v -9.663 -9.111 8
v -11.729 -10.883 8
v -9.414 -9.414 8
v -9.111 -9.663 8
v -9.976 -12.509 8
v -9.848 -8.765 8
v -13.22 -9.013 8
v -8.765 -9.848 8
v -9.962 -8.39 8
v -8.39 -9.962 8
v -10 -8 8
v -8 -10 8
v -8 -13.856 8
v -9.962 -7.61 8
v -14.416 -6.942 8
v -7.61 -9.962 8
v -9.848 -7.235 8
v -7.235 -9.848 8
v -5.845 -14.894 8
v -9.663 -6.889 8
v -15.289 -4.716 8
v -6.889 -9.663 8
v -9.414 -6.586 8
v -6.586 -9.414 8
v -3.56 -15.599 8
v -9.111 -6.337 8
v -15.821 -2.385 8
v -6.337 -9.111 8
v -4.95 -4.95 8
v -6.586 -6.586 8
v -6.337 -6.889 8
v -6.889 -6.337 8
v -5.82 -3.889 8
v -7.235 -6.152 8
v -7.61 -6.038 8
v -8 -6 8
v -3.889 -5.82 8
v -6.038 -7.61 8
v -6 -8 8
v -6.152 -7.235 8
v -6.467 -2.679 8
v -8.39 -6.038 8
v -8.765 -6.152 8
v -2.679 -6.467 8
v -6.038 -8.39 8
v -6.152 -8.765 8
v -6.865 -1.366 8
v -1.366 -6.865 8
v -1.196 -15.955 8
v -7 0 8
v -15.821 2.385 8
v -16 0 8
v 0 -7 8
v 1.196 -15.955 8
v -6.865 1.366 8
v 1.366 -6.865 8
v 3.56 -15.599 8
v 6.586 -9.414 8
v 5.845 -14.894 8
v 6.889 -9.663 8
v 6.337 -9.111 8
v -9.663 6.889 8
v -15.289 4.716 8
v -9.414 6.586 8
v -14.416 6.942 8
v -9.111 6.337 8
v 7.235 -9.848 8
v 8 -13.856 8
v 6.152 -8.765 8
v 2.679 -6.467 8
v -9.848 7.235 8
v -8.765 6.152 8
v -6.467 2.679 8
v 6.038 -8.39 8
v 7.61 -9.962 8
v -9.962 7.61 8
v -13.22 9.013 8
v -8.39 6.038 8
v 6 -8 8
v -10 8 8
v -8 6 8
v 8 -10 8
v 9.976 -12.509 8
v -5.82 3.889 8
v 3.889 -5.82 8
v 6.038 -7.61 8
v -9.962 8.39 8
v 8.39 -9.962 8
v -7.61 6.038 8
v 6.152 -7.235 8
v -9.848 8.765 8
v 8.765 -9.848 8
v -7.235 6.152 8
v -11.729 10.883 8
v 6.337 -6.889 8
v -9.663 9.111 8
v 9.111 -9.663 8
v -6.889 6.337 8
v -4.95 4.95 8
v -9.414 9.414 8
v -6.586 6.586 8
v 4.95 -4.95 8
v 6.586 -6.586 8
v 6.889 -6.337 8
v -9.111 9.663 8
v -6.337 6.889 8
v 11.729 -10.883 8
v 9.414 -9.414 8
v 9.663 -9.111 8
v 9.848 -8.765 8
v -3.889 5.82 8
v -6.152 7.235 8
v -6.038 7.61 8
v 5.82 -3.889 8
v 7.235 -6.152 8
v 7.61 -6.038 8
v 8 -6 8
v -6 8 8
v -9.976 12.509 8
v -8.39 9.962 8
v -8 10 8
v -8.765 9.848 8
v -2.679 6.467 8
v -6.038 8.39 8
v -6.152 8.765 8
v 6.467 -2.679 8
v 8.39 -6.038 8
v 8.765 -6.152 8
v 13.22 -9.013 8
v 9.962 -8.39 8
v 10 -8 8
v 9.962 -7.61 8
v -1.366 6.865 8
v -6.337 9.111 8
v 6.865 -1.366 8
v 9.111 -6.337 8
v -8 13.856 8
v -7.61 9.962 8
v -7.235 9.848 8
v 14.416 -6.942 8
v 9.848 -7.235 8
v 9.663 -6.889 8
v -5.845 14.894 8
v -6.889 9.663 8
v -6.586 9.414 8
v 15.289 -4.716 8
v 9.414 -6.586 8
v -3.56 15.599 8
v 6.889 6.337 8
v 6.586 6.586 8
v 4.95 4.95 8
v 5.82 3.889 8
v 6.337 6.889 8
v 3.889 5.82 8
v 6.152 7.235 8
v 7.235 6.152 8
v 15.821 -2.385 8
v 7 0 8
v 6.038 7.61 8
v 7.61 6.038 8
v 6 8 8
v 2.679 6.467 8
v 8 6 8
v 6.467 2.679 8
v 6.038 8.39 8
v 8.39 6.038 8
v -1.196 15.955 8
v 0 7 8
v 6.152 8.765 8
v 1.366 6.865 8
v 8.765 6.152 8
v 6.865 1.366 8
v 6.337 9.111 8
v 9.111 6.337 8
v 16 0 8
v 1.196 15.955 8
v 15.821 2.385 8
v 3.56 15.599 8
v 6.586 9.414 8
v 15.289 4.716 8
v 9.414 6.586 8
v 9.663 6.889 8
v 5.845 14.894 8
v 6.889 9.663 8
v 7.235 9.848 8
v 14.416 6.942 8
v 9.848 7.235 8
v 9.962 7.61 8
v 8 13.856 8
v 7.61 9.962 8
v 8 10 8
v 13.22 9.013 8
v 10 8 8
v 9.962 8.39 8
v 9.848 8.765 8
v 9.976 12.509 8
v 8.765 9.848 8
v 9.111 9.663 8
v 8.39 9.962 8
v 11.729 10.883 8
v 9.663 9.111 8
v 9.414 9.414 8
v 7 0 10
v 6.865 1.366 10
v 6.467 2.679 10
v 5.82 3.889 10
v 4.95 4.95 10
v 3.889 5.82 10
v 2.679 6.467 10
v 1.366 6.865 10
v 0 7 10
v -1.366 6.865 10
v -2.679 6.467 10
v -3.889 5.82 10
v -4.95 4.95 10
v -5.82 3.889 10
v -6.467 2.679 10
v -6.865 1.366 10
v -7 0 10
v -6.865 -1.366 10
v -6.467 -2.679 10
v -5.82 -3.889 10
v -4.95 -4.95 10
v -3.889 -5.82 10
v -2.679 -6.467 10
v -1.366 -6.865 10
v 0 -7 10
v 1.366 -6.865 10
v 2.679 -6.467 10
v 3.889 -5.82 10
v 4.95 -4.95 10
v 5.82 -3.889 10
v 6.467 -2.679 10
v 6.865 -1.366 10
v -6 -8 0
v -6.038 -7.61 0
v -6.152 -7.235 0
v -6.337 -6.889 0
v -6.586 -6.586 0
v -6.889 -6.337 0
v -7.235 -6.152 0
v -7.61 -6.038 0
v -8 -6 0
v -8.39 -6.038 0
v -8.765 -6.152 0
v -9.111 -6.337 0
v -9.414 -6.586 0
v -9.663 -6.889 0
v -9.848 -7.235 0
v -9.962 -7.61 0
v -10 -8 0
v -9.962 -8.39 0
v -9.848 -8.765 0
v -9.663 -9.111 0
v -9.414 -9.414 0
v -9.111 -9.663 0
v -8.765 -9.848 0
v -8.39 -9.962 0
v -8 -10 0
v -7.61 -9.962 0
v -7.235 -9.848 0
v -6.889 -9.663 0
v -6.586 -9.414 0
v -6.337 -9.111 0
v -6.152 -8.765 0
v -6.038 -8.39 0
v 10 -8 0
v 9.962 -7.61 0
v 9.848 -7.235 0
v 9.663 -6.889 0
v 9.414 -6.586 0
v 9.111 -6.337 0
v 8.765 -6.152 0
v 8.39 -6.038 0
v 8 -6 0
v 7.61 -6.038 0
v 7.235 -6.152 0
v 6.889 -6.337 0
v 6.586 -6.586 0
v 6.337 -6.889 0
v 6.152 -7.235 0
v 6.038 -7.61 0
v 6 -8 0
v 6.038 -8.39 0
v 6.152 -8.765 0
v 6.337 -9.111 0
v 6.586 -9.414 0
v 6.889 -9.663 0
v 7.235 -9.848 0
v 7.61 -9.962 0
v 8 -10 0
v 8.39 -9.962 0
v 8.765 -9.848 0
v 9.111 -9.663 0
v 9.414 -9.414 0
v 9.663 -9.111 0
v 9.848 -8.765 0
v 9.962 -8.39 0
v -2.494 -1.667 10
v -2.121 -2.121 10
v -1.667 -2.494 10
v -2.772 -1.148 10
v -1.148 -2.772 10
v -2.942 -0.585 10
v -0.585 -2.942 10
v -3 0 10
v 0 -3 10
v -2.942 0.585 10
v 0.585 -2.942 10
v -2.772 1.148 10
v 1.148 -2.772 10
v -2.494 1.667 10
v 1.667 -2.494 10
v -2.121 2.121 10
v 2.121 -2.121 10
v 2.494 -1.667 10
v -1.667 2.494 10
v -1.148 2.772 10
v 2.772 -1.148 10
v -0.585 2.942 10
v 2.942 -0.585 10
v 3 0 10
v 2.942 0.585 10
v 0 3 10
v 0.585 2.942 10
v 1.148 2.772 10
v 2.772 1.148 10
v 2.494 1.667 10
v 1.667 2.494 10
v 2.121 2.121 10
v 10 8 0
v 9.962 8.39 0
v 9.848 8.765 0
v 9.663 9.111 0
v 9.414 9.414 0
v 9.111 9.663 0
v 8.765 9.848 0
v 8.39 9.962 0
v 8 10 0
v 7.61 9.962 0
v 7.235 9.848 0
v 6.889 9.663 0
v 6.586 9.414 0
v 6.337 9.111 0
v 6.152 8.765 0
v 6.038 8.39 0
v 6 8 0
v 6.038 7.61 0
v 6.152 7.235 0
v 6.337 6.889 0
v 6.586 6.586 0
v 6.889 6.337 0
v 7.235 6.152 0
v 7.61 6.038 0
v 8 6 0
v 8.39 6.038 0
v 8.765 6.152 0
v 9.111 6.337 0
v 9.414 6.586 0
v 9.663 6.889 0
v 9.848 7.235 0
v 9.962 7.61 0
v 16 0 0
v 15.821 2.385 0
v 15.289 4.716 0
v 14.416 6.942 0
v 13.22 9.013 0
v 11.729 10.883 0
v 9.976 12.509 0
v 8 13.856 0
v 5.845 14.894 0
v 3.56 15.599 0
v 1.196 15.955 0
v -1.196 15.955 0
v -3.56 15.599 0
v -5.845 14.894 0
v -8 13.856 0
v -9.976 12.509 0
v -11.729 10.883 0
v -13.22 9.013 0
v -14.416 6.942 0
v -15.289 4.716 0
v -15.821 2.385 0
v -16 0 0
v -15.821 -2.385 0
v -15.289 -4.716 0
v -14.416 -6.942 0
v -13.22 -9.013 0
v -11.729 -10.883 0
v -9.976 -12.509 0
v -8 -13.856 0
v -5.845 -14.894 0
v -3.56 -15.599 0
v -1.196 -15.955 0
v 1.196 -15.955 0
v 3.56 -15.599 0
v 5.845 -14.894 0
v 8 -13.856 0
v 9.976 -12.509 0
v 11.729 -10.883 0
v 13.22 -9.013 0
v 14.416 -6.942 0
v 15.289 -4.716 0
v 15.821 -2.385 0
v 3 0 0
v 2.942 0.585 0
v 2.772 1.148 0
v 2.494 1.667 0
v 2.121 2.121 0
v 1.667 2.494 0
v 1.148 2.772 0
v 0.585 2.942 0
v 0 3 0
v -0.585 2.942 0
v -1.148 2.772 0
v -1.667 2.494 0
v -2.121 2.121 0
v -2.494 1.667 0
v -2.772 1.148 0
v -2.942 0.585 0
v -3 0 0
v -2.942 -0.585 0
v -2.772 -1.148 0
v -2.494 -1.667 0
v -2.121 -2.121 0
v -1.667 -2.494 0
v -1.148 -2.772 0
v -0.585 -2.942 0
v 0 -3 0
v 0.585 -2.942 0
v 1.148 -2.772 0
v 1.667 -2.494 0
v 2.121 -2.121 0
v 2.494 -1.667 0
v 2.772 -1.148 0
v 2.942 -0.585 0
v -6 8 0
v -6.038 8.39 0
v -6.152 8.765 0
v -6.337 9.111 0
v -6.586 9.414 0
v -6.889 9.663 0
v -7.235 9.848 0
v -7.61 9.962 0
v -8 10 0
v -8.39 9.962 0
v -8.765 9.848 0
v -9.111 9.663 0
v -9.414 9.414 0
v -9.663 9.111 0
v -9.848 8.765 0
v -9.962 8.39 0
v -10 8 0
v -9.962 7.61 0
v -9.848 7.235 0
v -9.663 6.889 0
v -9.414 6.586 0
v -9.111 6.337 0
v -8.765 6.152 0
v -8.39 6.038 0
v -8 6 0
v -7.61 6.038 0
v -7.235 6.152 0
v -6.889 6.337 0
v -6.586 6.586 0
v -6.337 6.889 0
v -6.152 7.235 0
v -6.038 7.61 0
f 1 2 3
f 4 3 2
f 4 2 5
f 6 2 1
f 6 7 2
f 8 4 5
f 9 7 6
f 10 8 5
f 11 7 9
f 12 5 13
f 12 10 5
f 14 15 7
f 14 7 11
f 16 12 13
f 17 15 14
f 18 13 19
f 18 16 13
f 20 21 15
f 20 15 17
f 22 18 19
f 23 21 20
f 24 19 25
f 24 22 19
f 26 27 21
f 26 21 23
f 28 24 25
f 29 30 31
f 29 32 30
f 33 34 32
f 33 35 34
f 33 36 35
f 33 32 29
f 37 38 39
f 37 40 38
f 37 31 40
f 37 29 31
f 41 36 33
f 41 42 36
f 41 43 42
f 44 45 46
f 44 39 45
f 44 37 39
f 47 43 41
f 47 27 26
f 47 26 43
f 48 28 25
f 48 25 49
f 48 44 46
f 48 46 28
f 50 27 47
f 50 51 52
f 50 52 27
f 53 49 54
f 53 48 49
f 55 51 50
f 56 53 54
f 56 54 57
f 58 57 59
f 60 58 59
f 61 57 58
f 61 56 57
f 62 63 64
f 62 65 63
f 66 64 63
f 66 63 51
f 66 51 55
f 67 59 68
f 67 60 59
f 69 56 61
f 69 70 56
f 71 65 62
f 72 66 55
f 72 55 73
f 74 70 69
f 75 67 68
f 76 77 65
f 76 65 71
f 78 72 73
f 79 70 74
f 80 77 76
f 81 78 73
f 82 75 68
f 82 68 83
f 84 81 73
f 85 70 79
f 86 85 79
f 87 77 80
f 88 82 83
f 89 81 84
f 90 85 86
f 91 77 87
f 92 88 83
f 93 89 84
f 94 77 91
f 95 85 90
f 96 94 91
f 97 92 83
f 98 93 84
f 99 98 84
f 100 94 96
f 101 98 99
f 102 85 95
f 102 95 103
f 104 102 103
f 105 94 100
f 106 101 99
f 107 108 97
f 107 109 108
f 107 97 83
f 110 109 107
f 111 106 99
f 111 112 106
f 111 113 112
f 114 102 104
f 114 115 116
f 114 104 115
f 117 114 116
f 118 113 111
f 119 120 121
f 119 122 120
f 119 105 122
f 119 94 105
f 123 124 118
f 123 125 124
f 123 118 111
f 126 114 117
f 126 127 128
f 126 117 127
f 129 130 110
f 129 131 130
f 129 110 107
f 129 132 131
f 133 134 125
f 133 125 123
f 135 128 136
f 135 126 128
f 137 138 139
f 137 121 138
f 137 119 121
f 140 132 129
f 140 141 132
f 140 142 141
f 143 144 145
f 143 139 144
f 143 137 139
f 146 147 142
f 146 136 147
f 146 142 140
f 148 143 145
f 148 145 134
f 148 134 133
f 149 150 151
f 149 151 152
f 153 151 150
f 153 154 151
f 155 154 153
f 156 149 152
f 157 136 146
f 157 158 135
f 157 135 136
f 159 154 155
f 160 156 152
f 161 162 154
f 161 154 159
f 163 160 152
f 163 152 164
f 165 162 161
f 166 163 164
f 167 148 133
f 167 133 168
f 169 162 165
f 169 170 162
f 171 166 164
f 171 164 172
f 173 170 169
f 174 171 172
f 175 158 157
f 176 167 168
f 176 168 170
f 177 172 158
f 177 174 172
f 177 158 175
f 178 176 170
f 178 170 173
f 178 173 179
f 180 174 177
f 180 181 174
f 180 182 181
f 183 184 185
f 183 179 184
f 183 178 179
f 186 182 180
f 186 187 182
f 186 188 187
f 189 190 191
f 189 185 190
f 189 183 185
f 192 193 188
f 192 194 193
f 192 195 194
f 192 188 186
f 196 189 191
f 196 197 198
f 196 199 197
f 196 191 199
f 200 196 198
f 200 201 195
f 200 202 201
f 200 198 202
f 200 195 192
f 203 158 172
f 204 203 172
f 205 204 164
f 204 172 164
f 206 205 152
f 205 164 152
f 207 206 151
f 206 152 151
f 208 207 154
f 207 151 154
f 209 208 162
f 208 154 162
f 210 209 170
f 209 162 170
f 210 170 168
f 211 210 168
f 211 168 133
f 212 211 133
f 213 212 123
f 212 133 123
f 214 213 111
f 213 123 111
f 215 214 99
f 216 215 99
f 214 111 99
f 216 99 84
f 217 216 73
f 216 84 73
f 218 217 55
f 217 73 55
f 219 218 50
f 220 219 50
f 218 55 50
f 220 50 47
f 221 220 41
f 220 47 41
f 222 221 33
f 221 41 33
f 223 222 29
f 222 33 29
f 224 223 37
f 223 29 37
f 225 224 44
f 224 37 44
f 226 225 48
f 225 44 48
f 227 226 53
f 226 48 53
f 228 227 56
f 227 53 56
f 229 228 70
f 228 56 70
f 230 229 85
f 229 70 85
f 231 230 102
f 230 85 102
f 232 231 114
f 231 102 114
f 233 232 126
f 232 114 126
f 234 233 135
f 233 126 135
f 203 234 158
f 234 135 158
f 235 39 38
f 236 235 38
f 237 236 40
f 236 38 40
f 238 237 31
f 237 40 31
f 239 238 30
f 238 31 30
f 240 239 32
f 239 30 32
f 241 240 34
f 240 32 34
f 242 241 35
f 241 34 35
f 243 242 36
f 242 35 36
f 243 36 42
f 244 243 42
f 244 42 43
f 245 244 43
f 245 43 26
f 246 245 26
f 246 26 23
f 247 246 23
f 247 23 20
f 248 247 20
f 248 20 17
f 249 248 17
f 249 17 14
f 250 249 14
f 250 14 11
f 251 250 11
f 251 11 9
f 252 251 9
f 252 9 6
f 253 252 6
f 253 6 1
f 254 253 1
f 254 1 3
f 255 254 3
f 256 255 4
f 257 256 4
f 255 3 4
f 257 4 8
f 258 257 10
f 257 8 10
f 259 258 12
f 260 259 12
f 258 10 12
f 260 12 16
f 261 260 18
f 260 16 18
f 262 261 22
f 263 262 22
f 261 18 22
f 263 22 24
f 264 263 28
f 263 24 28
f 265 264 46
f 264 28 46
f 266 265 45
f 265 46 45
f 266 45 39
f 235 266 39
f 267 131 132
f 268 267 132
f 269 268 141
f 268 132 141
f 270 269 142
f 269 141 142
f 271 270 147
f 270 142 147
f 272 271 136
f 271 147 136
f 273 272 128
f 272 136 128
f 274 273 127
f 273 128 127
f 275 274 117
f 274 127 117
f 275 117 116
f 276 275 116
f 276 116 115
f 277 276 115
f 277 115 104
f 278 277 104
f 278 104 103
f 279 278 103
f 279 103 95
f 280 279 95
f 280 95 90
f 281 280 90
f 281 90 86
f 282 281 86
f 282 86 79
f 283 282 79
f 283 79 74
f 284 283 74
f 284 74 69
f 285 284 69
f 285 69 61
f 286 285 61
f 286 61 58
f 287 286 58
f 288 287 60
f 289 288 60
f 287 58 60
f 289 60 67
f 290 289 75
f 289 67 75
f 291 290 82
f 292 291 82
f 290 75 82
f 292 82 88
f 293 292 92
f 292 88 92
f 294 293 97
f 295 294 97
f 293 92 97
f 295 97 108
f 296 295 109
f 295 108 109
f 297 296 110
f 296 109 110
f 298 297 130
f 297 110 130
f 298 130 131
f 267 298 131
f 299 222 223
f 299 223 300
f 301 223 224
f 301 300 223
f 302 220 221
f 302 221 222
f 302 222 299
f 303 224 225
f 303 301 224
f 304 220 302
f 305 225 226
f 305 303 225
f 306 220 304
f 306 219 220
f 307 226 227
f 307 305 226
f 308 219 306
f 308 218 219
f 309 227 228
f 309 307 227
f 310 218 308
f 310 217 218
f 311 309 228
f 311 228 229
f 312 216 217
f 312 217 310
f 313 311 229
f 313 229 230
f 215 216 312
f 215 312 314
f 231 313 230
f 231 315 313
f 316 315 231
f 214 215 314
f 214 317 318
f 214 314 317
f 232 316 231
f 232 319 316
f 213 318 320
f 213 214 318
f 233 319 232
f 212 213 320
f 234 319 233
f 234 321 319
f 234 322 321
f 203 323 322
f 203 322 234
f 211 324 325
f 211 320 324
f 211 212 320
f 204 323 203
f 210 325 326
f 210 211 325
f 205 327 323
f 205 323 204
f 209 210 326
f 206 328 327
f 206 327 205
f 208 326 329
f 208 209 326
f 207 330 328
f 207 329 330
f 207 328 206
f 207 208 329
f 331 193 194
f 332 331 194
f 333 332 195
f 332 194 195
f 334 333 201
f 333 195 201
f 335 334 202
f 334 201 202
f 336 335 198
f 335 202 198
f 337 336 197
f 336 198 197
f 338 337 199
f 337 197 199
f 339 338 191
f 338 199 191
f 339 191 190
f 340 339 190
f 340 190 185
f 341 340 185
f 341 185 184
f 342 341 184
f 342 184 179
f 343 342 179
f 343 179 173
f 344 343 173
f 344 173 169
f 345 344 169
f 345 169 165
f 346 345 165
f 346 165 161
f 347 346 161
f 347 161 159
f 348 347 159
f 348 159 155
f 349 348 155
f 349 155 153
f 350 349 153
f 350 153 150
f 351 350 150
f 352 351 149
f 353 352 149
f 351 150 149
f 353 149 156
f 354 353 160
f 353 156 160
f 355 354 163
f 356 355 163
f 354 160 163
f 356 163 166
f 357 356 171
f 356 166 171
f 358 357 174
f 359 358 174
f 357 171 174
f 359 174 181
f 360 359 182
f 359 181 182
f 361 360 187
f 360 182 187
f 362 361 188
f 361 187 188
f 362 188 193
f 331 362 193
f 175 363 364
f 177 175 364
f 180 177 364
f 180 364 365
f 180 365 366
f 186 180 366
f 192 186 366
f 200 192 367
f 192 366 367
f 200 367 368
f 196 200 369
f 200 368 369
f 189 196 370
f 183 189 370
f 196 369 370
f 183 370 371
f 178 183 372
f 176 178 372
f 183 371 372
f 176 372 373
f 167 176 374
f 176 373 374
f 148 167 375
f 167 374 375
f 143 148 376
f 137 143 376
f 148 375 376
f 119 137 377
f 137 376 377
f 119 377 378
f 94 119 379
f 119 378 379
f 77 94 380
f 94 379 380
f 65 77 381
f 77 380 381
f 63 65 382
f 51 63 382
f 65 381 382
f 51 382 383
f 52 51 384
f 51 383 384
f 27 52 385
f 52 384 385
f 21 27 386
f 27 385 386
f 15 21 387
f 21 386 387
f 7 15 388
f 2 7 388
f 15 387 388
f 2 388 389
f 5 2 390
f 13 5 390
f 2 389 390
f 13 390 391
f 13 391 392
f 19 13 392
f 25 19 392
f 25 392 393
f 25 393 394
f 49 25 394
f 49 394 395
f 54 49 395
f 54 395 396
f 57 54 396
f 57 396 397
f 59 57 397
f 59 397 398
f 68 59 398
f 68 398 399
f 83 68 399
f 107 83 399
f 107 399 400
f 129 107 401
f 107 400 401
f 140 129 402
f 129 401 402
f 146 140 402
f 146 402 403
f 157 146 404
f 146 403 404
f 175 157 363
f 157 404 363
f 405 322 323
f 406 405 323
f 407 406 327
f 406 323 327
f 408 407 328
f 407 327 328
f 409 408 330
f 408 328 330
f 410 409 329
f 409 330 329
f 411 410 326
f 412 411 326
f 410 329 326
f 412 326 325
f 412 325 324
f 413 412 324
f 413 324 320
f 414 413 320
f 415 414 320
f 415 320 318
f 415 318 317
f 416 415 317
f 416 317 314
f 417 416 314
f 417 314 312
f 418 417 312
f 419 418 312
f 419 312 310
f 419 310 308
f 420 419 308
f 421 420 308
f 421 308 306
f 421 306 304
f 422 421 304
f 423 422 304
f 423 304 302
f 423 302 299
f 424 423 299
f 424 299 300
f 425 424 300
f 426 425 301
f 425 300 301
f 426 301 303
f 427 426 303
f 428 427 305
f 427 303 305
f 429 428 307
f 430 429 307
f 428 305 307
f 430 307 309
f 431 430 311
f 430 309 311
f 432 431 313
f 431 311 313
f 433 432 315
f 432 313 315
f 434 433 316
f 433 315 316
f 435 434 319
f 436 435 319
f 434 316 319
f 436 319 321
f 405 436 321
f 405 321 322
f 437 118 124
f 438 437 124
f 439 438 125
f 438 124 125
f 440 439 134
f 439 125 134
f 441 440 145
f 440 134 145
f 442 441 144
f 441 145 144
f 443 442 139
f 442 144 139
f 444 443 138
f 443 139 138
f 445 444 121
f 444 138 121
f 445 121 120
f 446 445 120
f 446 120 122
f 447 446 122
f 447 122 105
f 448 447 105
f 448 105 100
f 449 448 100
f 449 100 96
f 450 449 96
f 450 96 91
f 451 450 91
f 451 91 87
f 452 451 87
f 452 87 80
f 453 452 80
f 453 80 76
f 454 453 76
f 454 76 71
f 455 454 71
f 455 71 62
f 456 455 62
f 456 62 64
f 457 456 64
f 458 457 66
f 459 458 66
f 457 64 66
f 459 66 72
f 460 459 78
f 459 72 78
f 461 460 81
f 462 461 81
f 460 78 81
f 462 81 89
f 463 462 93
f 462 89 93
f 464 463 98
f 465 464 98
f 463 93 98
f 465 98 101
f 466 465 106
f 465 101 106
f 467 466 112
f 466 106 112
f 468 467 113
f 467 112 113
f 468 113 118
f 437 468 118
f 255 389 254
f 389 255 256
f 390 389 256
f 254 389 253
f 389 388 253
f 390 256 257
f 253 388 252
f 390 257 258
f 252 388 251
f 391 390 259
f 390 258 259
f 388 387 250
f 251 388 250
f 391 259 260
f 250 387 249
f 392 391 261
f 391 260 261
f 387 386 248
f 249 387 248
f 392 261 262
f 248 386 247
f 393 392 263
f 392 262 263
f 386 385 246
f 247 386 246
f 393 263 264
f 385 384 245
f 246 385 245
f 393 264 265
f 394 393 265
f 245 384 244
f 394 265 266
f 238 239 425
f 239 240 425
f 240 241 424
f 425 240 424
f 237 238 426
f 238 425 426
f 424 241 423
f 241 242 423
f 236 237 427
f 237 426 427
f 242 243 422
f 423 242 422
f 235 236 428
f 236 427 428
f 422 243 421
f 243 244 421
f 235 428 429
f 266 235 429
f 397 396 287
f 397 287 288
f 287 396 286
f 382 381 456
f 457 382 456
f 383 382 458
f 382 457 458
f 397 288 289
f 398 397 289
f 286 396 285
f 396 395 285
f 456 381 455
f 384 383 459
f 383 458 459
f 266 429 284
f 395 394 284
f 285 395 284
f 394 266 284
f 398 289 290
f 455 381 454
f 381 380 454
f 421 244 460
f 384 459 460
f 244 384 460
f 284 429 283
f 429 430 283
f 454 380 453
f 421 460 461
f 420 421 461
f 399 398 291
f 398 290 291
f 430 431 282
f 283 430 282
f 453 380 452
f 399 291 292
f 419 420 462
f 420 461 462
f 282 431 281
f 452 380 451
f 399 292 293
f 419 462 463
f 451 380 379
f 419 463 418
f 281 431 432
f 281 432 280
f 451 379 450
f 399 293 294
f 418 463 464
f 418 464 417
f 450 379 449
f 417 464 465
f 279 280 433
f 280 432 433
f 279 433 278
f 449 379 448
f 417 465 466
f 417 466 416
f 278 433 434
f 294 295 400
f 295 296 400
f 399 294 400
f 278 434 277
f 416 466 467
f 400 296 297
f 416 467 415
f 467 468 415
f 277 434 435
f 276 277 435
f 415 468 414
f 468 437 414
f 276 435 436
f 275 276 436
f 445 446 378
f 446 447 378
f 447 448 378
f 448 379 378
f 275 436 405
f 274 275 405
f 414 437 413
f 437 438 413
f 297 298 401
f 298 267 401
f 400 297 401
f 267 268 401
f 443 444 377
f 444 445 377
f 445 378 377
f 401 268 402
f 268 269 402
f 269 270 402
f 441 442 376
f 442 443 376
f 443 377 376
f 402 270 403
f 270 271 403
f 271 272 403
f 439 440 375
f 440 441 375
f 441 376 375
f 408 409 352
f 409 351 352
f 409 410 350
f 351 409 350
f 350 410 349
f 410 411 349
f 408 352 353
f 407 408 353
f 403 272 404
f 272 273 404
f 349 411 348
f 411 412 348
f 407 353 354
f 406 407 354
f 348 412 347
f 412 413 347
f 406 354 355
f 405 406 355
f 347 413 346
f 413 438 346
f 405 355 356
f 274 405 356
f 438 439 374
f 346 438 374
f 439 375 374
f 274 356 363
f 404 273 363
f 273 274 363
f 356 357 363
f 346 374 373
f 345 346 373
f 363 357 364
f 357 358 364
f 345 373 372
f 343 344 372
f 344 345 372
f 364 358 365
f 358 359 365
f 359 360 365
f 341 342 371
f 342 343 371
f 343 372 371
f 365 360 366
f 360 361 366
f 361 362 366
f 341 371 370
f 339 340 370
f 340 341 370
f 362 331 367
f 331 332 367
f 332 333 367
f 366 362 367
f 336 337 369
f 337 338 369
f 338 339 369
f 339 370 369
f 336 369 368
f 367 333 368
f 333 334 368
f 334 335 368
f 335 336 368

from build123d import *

# Parameters (mm, degrees)
SKETCH_1_R          = 16
EXTRUDE_1_DEPTH     = 8
SKETCH_2_R          = 7
EXTRUDE_2_DEPTH     = 2
SKETCH_3_R          = 2
CUT_EXTRUDE_1_DEPTH = 20
SKETCH_4_R          = 3
CUT_EXTRUDE_2_DEPTH = 20


with BuildPart() as part:
    # 草图1 → 凸台-拉伸1 (new body)
    with BuildSketch(Plane.XY):
        Circle(SKETCH_1_R)
    extrude(amount=EXTRUDE_1_DEPTH)

    # 草图2 → 凸台-拉伸2 (add)
    with BuildSketch(Plane.XY.offset(8)):
        Circle(SKETCH_2_R)
    extrude(amount=EXTRUDE_2_DEPTH)

    # 草图3 → 切除-拉伸1 (cut)
    with BuildSketch(Plane.XY.offset(8)):
        with Locations((-8, 8)):
            Circle(SKETCH_3_R)
        with Locations((8, 8)):
            Circle(SKETCH_3_R)
        with Locations((8, -8)):
            Circle(SKETCH_3_R)
        with Locations((-8, -8)):
            Circle(SKETCH_3_R)
    extrude(amount=-CUT_EXTRUDE_1_DEPTH, mode=Mode.SUBTRACT)

    # 草图4 → 切除-拉伸2 (cut)
    with BuildSketch(Plane.XY.offset(10)):
        Circle(SKETCH_4_R)
    extrude(amount=-CUT_EXTRUDE_2_DEPTH, mode=Mode.SUBTRACT)


solid = part.part
